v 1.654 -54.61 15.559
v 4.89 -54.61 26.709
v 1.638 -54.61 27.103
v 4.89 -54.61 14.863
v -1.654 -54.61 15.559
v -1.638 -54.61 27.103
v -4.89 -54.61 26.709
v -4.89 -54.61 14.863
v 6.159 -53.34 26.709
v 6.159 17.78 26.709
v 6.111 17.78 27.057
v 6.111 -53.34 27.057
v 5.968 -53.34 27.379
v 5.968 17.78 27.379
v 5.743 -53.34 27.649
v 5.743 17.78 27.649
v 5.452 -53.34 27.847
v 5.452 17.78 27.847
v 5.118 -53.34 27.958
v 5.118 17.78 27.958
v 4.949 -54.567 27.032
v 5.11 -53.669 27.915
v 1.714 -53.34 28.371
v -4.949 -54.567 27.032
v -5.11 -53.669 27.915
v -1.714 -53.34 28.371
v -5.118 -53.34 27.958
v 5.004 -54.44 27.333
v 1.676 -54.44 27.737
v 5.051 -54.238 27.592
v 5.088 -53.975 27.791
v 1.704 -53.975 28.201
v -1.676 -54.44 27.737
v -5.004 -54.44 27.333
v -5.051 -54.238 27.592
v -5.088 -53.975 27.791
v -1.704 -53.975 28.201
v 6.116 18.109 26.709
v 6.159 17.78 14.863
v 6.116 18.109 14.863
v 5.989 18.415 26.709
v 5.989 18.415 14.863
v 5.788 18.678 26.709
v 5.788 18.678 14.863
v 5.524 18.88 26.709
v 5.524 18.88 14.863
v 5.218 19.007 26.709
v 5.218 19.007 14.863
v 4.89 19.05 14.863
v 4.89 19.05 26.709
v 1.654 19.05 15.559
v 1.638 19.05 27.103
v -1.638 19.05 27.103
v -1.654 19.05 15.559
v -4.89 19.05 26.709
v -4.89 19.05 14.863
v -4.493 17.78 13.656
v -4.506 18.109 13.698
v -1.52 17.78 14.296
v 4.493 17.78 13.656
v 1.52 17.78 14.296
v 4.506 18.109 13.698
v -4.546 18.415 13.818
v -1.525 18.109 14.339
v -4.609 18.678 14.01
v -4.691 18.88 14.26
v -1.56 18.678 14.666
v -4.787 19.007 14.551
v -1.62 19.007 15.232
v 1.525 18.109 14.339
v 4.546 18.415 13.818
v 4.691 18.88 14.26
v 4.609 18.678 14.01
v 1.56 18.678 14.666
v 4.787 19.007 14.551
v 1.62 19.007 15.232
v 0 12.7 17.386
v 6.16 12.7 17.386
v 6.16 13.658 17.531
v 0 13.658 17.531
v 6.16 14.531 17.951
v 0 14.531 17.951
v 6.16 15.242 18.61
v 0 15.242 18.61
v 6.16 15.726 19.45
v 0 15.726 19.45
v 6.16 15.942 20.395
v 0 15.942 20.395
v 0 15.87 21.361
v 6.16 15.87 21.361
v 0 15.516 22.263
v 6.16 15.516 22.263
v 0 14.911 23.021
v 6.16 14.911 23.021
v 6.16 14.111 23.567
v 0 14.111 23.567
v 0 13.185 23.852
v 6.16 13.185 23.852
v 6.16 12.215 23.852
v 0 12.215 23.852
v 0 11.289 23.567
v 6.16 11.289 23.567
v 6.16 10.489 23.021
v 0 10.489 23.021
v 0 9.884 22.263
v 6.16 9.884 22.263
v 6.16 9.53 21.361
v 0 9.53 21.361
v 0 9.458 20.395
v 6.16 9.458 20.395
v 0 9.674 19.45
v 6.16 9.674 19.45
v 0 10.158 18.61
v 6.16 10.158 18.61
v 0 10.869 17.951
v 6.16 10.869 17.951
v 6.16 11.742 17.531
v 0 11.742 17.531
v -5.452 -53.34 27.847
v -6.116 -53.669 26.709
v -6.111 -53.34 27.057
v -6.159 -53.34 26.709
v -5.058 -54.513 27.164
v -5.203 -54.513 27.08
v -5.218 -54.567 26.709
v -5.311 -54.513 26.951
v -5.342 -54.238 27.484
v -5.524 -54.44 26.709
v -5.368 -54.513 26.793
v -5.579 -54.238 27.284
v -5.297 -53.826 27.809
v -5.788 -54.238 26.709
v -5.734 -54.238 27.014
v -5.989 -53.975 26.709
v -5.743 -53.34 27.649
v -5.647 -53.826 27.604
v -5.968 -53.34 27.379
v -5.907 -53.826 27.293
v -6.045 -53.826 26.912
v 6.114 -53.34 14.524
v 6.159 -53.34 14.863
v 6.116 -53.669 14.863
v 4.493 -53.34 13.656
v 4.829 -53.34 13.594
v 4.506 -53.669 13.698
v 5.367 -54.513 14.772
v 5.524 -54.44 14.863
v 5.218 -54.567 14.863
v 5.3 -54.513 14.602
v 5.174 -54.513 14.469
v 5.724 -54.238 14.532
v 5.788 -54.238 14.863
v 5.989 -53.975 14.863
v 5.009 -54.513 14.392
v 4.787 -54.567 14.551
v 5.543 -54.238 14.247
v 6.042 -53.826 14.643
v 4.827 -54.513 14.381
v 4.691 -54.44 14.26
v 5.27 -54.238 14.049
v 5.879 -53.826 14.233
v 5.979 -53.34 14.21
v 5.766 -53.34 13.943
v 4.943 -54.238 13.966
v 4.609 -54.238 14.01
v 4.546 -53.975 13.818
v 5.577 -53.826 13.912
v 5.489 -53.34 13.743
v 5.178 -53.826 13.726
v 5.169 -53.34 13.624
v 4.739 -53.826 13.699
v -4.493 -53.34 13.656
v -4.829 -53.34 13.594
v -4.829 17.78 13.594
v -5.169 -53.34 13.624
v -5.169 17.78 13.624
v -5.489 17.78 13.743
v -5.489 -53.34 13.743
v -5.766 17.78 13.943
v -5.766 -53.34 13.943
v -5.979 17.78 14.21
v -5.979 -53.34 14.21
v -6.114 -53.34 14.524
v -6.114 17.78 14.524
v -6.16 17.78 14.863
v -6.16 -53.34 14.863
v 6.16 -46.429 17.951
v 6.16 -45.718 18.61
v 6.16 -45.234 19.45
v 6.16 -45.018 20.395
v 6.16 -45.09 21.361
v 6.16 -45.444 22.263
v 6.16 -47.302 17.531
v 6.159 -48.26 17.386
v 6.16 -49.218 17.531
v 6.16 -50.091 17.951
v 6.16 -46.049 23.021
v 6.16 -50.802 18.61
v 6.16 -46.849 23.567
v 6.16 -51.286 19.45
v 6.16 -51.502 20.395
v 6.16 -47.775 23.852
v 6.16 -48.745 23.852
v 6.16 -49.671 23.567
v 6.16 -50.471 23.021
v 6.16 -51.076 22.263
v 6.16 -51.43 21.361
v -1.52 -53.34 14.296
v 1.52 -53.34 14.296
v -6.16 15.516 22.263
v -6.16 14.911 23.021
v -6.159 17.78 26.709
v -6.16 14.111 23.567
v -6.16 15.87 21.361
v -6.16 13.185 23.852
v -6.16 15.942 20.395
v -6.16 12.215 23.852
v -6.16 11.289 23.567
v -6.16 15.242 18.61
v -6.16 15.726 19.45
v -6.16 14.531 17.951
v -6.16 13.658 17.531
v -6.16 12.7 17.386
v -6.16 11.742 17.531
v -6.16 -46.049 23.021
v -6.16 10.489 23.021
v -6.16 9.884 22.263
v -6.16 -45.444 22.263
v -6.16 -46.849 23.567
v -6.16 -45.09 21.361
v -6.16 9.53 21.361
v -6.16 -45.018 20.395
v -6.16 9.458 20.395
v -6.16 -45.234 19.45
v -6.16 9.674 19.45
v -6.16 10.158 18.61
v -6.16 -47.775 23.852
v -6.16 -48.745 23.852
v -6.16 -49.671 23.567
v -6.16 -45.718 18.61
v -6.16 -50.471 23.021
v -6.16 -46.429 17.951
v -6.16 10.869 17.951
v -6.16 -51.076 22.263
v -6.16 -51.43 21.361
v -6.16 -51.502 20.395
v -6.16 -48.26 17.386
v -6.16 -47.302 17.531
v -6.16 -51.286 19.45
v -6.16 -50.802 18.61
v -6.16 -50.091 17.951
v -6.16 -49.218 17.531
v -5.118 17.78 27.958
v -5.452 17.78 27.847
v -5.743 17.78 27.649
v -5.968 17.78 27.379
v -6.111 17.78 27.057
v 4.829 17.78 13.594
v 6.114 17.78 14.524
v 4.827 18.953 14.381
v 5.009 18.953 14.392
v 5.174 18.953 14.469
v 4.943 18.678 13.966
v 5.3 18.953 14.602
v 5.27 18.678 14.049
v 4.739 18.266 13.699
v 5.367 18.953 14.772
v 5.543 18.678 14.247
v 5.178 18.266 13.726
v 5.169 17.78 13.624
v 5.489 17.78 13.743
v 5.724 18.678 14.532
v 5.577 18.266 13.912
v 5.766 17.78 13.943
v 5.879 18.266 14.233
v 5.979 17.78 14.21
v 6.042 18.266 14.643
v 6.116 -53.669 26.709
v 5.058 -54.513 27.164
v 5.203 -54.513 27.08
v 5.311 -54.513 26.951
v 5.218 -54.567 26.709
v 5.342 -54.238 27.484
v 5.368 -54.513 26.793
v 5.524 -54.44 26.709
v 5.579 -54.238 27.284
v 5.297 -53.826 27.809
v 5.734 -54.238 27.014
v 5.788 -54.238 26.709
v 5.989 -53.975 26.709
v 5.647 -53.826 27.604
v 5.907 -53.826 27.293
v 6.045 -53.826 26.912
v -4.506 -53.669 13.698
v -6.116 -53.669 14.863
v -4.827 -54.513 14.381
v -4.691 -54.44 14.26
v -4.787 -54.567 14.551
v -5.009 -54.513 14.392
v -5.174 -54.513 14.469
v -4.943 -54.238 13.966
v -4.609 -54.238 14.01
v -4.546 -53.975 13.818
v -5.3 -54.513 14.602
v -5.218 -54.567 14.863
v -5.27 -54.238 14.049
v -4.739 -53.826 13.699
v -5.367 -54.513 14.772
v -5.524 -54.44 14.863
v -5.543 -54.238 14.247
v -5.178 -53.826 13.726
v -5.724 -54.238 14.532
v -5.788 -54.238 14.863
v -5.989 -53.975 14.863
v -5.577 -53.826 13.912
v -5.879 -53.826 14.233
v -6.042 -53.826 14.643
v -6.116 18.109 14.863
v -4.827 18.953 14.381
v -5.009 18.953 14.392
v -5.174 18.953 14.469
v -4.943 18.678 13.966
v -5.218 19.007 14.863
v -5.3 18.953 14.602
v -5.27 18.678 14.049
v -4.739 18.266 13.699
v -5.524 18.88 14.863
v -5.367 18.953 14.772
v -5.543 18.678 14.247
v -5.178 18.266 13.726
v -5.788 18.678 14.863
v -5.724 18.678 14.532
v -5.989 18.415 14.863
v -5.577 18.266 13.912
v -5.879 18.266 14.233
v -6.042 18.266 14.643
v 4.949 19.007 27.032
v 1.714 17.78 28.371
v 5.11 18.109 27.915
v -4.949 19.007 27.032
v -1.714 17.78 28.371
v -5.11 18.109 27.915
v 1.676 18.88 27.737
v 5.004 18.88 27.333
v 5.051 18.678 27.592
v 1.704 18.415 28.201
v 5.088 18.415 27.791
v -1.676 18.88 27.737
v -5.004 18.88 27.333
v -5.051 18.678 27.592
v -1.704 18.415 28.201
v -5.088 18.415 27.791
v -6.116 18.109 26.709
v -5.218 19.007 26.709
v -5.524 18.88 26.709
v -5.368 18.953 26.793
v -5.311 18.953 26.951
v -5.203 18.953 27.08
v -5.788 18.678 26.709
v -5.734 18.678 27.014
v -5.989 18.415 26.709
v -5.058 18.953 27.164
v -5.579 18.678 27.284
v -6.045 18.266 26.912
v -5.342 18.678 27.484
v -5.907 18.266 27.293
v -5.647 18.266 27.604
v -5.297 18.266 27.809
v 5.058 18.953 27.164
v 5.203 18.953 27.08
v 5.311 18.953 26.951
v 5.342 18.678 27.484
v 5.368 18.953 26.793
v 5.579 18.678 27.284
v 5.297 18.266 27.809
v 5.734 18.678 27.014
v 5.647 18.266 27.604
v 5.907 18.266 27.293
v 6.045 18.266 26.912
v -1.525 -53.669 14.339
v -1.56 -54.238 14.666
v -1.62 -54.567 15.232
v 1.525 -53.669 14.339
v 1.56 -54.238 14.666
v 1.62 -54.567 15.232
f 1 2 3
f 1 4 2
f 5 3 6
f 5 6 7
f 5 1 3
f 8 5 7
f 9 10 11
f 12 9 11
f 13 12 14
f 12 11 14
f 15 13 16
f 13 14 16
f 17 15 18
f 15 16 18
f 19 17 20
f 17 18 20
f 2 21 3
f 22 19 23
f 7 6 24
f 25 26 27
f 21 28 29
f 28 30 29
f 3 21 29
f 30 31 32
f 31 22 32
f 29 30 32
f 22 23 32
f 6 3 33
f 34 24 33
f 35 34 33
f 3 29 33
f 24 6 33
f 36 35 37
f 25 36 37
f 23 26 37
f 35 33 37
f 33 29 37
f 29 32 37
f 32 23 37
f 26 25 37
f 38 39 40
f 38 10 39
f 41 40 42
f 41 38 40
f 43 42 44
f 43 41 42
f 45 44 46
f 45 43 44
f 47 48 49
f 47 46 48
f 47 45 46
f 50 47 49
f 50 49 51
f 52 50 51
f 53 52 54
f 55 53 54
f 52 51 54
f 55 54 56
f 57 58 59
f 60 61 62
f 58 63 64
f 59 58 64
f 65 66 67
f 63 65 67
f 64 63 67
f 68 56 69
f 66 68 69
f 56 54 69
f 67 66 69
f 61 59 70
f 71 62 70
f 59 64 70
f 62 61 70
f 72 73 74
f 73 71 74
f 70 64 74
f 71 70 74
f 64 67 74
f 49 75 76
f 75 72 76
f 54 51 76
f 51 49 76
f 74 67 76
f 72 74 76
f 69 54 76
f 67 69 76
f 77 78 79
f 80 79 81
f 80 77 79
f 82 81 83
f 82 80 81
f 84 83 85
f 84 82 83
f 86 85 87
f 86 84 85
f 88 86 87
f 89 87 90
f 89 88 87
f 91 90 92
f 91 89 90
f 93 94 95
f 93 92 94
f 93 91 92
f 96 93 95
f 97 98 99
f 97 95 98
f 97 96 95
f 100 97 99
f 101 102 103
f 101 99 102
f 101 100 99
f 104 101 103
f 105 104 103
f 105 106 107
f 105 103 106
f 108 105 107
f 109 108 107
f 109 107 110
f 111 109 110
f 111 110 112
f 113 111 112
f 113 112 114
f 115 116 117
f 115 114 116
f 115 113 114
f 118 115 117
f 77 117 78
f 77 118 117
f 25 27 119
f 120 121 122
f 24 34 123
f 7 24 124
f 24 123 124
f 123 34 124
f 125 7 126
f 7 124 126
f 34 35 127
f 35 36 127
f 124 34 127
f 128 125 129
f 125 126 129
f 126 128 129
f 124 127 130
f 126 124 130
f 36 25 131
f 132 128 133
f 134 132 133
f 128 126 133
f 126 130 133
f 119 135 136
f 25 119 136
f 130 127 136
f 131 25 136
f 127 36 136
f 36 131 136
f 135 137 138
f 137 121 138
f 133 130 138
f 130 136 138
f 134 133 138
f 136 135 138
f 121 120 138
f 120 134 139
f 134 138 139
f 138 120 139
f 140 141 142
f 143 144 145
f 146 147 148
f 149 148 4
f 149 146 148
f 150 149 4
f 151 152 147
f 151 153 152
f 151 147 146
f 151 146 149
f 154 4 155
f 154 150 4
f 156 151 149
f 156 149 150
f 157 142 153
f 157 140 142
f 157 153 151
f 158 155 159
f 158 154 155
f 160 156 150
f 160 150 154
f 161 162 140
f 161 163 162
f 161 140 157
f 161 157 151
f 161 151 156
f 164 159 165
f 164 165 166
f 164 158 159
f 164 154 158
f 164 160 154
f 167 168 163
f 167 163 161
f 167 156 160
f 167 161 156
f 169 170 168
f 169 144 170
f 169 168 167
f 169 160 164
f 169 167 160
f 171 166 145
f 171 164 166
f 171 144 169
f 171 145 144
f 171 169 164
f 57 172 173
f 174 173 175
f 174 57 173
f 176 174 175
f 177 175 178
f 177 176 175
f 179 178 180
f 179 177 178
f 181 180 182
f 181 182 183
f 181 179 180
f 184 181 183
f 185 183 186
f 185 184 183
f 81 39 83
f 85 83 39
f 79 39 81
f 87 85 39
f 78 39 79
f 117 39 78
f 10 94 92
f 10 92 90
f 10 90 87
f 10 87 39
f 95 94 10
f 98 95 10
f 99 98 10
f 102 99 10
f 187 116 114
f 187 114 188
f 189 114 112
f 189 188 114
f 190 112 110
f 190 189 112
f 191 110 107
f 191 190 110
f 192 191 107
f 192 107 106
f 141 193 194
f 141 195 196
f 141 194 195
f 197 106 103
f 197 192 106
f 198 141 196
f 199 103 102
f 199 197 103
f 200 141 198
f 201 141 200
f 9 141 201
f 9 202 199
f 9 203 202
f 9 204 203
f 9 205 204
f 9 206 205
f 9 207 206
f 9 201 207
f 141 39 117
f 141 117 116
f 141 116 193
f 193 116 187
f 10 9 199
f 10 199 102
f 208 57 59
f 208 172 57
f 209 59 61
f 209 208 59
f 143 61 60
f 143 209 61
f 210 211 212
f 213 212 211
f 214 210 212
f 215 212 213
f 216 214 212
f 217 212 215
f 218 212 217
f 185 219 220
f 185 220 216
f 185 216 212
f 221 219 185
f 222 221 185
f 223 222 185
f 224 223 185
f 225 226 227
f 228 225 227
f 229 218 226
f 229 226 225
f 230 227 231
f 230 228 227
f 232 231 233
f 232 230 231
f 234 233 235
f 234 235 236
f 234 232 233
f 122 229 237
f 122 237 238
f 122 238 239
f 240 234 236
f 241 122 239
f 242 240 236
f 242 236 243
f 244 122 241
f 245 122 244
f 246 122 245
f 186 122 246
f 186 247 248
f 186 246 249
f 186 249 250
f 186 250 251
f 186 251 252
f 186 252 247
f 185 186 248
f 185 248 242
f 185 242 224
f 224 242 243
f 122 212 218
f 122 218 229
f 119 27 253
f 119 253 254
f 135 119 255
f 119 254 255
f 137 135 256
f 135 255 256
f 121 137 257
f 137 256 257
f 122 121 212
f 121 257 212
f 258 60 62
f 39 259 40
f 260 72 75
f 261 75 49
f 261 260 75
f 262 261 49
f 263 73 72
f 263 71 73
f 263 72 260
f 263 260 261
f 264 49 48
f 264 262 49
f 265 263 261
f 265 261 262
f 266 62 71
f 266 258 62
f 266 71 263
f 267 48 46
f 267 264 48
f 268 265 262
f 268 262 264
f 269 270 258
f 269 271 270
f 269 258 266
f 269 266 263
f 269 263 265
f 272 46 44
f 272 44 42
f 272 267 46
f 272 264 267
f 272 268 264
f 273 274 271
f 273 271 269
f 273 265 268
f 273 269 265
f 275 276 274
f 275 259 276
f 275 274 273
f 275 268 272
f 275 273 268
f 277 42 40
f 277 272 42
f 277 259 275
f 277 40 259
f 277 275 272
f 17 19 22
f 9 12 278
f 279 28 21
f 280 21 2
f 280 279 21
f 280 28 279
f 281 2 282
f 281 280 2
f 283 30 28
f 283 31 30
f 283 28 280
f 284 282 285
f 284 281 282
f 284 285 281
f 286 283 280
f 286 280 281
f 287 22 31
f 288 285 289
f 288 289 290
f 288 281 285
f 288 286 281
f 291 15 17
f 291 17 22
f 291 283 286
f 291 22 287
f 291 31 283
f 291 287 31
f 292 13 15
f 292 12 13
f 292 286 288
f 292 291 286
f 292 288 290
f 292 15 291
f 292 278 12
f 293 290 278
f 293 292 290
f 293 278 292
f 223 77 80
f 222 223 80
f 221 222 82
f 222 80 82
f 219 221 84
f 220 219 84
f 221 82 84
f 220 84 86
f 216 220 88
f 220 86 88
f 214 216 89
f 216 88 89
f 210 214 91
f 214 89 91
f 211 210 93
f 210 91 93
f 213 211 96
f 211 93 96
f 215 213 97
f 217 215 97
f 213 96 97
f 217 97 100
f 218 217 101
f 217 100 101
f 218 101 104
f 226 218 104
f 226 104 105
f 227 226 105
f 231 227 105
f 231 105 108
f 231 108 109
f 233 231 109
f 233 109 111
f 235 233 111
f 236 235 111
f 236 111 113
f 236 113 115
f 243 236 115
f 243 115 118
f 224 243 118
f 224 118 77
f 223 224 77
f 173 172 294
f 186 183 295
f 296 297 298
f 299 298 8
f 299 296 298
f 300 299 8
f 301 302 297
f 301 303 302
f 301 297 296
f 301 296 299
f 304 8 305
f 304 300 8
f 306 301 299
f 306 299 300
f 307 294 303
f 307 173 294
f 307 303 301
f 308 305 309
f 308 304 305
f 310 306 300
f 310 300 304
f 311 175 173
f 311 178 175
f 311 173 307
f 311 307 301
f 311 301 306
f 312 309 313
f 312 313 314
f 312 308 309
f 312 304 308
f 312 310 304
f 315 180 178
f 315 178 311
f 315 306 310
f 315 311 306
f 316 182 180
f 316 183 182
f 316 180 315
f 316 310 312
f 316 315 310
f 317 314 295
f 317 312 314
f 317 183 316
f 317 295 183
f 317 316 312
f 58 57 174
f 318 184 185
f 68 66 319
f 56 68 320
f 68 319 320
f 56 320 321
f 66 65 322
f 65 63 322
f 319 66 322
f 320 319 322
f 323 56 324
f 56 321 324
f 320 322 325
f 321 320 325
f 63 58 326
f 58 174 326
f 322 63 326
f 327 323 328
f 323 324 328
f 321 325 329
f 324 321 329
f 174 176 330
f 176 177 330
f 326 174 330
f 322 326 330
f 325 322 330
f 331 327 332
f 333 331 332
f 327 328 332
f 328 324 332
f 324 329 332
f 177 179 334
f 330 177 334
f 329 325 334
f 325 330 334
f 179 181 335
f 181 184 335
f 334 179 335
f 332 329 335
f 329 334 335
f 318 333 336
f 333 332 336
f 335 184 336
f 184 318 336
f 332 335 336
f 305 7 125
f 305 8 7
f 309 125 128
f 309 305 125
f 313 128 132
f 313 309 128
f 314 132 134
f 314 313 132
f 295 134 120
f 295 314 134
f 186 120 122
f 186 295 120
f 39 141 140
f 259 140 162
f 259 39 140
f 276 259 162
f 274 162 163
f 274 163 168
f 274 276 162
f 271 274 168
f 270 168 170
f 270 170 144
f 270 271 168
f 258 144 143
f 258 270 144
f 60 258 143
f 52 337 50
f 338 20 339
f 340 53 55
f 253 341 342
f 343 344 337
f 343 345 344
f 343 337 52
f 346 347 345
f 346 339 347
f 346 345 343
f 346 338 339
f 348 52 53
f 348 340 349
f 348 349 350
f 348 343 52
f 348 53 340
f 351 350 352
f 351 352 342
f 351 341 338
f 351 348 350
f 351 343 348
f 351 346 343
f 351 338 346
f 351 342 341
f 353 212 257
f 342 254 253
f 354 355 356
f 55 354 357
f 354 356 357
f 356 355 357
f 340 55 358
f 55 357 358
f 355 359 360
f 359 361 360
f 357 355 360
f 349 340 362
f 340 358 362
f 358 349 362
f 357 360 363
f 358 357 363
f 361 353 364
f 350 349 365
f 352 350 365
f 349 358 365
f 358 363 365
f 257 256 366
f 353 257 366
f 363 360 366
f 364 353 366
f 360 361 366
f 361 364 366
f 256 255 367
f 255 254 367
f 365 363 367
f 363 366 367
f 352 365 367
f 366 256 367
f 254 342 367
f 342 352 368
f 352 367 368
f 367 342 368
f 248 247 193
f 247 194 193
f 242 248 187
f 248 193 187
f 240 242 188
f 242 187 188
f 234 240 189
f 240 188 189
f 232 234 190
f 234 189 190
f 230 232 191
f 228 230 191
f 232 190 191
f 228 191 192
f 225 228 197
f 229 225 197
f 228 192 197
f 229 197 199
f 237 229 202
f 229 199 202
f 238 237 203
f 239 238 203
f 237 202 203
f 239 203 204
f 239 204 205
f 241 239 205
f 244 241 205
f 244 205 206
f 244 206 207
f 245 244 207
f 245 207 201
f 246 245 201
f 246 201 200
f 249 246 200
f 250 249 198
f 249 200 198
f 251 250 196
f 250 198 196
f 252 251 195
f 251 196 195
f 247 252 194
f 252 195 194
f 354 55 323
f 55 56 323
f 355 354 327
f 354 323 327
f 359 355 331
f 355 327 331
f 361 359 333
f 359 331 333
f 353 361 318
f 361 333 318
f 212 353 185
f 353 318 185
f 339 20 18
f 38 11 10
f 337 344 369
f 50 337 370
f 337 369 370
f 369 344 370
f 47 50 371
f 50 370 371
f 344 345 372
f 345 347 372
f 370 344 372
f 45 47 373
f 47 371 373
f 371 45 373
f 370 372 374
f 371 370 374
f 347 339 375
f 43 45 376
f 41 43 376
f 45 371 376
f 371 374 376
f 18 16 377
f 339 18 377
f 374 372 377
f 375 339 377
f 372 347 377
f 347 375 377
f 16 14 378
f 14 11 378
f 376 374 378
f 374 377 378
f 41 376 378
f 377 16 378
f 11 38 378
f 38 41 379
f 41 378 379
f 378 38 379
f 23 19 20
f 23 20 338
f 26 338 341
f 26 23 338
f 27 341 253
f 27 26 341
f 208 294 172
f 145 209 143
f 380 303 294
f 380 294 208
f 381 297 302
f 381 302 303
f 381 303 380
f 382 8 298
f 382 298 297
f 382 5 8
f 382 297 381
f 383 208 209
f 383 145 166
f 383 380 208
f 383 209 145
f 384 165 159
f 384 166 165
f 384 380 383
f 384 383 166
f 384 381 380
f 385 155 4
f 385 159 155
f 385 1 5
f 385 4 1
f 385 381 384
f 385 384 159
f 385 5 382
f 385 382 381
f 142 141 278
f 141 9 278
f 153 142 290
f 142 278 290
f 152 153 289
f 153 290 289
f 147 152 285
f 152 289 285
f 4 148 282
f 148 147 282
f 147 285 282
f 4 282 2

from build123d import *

# Parameters (mm, degrees)
BOSS_EXTRUDE1_DEPTH      = 19.05
BOSS_EXTRUDE1_DEPTH_BACK = 54.61
SKETCH2_R                = 3.2512
CUT_EXTRUDE1_DEPTH       = 9.525
FILLET1_R                = 1.27


with BuildPart() as part:
    # Sketch1 → Boss-Extrude1 (new, two sides: drawn at the far end of the back side and taken through both)
    with BuildSketch(Plane(origin=(0, 0, 0), x_dir=(1, 0, 0), z_dir=(0, 1, 0)).offset(-BOSS_EXTRUDE1_DEPTH_BACK)):
        with BuildLine():
            Line((6.1595, -12.990051451), (6.1595, -27.747157521))
            ThreePointArc((6.1595, -27.747157521), (0, -28.4226), (-6.1595, -27.747157521))
            Line((-6.1595, -27.747157521), (-6.1595, -12.990051451))
            ThreePointArc((-6.1595, -12.990051451), (0, -14.3764), (6.1595, -12.990051451))
        make_face()
    extrude(amount=BOSS_EXTRUDE1_DEPTH + BOSS_EXTRUDE1_DEPTH_BACK)

    # Sketch2 → Cut-Extrude1 (cut, symmetric)
    with BuildSketch(Plane(origin=(0, 0, 0), x_dir=(0, 0, -1), z_dir=(1, 0, 0))):
        with Locations((-20.6375, 12.7)):
            Circle(SKETCH2_R)
        with Locations((-20.6375, -48.26)):
            Circle(SKETCH2_R)
    extrude(amount=CUT_EXTRUDE1_DEPTH, both=True, mode=Mode.SUBTRACT)

    # Fillet1
    fillet1_edges = [part.edges().sort_by_distance(p)[0] for p in [
        (0, -54.61, 28.4226),
        (0, 19.05, 14.3764),
        (-6.1595, 19.05, 20.368604486),
        (6.1595, -54.61, 20.368604486),
        (0, 19.05, 28.4226),
        (6.1595, 19.05, 20.368604486),
        (0, -54.61, 14.3764),
        (-6.1595, -54.61, 20.368604486),
        (6.1595, -17.78, 12.990051451),
        (6.1595, -17.78, 27.747157521),
        (-6.1595, -17.78, 27.747157521),
        (-6.1595, -17.78, 12.990051451),
    ]]
    fillet(fillet1_edges, radius=FILLET1_R)


solid = part.part
